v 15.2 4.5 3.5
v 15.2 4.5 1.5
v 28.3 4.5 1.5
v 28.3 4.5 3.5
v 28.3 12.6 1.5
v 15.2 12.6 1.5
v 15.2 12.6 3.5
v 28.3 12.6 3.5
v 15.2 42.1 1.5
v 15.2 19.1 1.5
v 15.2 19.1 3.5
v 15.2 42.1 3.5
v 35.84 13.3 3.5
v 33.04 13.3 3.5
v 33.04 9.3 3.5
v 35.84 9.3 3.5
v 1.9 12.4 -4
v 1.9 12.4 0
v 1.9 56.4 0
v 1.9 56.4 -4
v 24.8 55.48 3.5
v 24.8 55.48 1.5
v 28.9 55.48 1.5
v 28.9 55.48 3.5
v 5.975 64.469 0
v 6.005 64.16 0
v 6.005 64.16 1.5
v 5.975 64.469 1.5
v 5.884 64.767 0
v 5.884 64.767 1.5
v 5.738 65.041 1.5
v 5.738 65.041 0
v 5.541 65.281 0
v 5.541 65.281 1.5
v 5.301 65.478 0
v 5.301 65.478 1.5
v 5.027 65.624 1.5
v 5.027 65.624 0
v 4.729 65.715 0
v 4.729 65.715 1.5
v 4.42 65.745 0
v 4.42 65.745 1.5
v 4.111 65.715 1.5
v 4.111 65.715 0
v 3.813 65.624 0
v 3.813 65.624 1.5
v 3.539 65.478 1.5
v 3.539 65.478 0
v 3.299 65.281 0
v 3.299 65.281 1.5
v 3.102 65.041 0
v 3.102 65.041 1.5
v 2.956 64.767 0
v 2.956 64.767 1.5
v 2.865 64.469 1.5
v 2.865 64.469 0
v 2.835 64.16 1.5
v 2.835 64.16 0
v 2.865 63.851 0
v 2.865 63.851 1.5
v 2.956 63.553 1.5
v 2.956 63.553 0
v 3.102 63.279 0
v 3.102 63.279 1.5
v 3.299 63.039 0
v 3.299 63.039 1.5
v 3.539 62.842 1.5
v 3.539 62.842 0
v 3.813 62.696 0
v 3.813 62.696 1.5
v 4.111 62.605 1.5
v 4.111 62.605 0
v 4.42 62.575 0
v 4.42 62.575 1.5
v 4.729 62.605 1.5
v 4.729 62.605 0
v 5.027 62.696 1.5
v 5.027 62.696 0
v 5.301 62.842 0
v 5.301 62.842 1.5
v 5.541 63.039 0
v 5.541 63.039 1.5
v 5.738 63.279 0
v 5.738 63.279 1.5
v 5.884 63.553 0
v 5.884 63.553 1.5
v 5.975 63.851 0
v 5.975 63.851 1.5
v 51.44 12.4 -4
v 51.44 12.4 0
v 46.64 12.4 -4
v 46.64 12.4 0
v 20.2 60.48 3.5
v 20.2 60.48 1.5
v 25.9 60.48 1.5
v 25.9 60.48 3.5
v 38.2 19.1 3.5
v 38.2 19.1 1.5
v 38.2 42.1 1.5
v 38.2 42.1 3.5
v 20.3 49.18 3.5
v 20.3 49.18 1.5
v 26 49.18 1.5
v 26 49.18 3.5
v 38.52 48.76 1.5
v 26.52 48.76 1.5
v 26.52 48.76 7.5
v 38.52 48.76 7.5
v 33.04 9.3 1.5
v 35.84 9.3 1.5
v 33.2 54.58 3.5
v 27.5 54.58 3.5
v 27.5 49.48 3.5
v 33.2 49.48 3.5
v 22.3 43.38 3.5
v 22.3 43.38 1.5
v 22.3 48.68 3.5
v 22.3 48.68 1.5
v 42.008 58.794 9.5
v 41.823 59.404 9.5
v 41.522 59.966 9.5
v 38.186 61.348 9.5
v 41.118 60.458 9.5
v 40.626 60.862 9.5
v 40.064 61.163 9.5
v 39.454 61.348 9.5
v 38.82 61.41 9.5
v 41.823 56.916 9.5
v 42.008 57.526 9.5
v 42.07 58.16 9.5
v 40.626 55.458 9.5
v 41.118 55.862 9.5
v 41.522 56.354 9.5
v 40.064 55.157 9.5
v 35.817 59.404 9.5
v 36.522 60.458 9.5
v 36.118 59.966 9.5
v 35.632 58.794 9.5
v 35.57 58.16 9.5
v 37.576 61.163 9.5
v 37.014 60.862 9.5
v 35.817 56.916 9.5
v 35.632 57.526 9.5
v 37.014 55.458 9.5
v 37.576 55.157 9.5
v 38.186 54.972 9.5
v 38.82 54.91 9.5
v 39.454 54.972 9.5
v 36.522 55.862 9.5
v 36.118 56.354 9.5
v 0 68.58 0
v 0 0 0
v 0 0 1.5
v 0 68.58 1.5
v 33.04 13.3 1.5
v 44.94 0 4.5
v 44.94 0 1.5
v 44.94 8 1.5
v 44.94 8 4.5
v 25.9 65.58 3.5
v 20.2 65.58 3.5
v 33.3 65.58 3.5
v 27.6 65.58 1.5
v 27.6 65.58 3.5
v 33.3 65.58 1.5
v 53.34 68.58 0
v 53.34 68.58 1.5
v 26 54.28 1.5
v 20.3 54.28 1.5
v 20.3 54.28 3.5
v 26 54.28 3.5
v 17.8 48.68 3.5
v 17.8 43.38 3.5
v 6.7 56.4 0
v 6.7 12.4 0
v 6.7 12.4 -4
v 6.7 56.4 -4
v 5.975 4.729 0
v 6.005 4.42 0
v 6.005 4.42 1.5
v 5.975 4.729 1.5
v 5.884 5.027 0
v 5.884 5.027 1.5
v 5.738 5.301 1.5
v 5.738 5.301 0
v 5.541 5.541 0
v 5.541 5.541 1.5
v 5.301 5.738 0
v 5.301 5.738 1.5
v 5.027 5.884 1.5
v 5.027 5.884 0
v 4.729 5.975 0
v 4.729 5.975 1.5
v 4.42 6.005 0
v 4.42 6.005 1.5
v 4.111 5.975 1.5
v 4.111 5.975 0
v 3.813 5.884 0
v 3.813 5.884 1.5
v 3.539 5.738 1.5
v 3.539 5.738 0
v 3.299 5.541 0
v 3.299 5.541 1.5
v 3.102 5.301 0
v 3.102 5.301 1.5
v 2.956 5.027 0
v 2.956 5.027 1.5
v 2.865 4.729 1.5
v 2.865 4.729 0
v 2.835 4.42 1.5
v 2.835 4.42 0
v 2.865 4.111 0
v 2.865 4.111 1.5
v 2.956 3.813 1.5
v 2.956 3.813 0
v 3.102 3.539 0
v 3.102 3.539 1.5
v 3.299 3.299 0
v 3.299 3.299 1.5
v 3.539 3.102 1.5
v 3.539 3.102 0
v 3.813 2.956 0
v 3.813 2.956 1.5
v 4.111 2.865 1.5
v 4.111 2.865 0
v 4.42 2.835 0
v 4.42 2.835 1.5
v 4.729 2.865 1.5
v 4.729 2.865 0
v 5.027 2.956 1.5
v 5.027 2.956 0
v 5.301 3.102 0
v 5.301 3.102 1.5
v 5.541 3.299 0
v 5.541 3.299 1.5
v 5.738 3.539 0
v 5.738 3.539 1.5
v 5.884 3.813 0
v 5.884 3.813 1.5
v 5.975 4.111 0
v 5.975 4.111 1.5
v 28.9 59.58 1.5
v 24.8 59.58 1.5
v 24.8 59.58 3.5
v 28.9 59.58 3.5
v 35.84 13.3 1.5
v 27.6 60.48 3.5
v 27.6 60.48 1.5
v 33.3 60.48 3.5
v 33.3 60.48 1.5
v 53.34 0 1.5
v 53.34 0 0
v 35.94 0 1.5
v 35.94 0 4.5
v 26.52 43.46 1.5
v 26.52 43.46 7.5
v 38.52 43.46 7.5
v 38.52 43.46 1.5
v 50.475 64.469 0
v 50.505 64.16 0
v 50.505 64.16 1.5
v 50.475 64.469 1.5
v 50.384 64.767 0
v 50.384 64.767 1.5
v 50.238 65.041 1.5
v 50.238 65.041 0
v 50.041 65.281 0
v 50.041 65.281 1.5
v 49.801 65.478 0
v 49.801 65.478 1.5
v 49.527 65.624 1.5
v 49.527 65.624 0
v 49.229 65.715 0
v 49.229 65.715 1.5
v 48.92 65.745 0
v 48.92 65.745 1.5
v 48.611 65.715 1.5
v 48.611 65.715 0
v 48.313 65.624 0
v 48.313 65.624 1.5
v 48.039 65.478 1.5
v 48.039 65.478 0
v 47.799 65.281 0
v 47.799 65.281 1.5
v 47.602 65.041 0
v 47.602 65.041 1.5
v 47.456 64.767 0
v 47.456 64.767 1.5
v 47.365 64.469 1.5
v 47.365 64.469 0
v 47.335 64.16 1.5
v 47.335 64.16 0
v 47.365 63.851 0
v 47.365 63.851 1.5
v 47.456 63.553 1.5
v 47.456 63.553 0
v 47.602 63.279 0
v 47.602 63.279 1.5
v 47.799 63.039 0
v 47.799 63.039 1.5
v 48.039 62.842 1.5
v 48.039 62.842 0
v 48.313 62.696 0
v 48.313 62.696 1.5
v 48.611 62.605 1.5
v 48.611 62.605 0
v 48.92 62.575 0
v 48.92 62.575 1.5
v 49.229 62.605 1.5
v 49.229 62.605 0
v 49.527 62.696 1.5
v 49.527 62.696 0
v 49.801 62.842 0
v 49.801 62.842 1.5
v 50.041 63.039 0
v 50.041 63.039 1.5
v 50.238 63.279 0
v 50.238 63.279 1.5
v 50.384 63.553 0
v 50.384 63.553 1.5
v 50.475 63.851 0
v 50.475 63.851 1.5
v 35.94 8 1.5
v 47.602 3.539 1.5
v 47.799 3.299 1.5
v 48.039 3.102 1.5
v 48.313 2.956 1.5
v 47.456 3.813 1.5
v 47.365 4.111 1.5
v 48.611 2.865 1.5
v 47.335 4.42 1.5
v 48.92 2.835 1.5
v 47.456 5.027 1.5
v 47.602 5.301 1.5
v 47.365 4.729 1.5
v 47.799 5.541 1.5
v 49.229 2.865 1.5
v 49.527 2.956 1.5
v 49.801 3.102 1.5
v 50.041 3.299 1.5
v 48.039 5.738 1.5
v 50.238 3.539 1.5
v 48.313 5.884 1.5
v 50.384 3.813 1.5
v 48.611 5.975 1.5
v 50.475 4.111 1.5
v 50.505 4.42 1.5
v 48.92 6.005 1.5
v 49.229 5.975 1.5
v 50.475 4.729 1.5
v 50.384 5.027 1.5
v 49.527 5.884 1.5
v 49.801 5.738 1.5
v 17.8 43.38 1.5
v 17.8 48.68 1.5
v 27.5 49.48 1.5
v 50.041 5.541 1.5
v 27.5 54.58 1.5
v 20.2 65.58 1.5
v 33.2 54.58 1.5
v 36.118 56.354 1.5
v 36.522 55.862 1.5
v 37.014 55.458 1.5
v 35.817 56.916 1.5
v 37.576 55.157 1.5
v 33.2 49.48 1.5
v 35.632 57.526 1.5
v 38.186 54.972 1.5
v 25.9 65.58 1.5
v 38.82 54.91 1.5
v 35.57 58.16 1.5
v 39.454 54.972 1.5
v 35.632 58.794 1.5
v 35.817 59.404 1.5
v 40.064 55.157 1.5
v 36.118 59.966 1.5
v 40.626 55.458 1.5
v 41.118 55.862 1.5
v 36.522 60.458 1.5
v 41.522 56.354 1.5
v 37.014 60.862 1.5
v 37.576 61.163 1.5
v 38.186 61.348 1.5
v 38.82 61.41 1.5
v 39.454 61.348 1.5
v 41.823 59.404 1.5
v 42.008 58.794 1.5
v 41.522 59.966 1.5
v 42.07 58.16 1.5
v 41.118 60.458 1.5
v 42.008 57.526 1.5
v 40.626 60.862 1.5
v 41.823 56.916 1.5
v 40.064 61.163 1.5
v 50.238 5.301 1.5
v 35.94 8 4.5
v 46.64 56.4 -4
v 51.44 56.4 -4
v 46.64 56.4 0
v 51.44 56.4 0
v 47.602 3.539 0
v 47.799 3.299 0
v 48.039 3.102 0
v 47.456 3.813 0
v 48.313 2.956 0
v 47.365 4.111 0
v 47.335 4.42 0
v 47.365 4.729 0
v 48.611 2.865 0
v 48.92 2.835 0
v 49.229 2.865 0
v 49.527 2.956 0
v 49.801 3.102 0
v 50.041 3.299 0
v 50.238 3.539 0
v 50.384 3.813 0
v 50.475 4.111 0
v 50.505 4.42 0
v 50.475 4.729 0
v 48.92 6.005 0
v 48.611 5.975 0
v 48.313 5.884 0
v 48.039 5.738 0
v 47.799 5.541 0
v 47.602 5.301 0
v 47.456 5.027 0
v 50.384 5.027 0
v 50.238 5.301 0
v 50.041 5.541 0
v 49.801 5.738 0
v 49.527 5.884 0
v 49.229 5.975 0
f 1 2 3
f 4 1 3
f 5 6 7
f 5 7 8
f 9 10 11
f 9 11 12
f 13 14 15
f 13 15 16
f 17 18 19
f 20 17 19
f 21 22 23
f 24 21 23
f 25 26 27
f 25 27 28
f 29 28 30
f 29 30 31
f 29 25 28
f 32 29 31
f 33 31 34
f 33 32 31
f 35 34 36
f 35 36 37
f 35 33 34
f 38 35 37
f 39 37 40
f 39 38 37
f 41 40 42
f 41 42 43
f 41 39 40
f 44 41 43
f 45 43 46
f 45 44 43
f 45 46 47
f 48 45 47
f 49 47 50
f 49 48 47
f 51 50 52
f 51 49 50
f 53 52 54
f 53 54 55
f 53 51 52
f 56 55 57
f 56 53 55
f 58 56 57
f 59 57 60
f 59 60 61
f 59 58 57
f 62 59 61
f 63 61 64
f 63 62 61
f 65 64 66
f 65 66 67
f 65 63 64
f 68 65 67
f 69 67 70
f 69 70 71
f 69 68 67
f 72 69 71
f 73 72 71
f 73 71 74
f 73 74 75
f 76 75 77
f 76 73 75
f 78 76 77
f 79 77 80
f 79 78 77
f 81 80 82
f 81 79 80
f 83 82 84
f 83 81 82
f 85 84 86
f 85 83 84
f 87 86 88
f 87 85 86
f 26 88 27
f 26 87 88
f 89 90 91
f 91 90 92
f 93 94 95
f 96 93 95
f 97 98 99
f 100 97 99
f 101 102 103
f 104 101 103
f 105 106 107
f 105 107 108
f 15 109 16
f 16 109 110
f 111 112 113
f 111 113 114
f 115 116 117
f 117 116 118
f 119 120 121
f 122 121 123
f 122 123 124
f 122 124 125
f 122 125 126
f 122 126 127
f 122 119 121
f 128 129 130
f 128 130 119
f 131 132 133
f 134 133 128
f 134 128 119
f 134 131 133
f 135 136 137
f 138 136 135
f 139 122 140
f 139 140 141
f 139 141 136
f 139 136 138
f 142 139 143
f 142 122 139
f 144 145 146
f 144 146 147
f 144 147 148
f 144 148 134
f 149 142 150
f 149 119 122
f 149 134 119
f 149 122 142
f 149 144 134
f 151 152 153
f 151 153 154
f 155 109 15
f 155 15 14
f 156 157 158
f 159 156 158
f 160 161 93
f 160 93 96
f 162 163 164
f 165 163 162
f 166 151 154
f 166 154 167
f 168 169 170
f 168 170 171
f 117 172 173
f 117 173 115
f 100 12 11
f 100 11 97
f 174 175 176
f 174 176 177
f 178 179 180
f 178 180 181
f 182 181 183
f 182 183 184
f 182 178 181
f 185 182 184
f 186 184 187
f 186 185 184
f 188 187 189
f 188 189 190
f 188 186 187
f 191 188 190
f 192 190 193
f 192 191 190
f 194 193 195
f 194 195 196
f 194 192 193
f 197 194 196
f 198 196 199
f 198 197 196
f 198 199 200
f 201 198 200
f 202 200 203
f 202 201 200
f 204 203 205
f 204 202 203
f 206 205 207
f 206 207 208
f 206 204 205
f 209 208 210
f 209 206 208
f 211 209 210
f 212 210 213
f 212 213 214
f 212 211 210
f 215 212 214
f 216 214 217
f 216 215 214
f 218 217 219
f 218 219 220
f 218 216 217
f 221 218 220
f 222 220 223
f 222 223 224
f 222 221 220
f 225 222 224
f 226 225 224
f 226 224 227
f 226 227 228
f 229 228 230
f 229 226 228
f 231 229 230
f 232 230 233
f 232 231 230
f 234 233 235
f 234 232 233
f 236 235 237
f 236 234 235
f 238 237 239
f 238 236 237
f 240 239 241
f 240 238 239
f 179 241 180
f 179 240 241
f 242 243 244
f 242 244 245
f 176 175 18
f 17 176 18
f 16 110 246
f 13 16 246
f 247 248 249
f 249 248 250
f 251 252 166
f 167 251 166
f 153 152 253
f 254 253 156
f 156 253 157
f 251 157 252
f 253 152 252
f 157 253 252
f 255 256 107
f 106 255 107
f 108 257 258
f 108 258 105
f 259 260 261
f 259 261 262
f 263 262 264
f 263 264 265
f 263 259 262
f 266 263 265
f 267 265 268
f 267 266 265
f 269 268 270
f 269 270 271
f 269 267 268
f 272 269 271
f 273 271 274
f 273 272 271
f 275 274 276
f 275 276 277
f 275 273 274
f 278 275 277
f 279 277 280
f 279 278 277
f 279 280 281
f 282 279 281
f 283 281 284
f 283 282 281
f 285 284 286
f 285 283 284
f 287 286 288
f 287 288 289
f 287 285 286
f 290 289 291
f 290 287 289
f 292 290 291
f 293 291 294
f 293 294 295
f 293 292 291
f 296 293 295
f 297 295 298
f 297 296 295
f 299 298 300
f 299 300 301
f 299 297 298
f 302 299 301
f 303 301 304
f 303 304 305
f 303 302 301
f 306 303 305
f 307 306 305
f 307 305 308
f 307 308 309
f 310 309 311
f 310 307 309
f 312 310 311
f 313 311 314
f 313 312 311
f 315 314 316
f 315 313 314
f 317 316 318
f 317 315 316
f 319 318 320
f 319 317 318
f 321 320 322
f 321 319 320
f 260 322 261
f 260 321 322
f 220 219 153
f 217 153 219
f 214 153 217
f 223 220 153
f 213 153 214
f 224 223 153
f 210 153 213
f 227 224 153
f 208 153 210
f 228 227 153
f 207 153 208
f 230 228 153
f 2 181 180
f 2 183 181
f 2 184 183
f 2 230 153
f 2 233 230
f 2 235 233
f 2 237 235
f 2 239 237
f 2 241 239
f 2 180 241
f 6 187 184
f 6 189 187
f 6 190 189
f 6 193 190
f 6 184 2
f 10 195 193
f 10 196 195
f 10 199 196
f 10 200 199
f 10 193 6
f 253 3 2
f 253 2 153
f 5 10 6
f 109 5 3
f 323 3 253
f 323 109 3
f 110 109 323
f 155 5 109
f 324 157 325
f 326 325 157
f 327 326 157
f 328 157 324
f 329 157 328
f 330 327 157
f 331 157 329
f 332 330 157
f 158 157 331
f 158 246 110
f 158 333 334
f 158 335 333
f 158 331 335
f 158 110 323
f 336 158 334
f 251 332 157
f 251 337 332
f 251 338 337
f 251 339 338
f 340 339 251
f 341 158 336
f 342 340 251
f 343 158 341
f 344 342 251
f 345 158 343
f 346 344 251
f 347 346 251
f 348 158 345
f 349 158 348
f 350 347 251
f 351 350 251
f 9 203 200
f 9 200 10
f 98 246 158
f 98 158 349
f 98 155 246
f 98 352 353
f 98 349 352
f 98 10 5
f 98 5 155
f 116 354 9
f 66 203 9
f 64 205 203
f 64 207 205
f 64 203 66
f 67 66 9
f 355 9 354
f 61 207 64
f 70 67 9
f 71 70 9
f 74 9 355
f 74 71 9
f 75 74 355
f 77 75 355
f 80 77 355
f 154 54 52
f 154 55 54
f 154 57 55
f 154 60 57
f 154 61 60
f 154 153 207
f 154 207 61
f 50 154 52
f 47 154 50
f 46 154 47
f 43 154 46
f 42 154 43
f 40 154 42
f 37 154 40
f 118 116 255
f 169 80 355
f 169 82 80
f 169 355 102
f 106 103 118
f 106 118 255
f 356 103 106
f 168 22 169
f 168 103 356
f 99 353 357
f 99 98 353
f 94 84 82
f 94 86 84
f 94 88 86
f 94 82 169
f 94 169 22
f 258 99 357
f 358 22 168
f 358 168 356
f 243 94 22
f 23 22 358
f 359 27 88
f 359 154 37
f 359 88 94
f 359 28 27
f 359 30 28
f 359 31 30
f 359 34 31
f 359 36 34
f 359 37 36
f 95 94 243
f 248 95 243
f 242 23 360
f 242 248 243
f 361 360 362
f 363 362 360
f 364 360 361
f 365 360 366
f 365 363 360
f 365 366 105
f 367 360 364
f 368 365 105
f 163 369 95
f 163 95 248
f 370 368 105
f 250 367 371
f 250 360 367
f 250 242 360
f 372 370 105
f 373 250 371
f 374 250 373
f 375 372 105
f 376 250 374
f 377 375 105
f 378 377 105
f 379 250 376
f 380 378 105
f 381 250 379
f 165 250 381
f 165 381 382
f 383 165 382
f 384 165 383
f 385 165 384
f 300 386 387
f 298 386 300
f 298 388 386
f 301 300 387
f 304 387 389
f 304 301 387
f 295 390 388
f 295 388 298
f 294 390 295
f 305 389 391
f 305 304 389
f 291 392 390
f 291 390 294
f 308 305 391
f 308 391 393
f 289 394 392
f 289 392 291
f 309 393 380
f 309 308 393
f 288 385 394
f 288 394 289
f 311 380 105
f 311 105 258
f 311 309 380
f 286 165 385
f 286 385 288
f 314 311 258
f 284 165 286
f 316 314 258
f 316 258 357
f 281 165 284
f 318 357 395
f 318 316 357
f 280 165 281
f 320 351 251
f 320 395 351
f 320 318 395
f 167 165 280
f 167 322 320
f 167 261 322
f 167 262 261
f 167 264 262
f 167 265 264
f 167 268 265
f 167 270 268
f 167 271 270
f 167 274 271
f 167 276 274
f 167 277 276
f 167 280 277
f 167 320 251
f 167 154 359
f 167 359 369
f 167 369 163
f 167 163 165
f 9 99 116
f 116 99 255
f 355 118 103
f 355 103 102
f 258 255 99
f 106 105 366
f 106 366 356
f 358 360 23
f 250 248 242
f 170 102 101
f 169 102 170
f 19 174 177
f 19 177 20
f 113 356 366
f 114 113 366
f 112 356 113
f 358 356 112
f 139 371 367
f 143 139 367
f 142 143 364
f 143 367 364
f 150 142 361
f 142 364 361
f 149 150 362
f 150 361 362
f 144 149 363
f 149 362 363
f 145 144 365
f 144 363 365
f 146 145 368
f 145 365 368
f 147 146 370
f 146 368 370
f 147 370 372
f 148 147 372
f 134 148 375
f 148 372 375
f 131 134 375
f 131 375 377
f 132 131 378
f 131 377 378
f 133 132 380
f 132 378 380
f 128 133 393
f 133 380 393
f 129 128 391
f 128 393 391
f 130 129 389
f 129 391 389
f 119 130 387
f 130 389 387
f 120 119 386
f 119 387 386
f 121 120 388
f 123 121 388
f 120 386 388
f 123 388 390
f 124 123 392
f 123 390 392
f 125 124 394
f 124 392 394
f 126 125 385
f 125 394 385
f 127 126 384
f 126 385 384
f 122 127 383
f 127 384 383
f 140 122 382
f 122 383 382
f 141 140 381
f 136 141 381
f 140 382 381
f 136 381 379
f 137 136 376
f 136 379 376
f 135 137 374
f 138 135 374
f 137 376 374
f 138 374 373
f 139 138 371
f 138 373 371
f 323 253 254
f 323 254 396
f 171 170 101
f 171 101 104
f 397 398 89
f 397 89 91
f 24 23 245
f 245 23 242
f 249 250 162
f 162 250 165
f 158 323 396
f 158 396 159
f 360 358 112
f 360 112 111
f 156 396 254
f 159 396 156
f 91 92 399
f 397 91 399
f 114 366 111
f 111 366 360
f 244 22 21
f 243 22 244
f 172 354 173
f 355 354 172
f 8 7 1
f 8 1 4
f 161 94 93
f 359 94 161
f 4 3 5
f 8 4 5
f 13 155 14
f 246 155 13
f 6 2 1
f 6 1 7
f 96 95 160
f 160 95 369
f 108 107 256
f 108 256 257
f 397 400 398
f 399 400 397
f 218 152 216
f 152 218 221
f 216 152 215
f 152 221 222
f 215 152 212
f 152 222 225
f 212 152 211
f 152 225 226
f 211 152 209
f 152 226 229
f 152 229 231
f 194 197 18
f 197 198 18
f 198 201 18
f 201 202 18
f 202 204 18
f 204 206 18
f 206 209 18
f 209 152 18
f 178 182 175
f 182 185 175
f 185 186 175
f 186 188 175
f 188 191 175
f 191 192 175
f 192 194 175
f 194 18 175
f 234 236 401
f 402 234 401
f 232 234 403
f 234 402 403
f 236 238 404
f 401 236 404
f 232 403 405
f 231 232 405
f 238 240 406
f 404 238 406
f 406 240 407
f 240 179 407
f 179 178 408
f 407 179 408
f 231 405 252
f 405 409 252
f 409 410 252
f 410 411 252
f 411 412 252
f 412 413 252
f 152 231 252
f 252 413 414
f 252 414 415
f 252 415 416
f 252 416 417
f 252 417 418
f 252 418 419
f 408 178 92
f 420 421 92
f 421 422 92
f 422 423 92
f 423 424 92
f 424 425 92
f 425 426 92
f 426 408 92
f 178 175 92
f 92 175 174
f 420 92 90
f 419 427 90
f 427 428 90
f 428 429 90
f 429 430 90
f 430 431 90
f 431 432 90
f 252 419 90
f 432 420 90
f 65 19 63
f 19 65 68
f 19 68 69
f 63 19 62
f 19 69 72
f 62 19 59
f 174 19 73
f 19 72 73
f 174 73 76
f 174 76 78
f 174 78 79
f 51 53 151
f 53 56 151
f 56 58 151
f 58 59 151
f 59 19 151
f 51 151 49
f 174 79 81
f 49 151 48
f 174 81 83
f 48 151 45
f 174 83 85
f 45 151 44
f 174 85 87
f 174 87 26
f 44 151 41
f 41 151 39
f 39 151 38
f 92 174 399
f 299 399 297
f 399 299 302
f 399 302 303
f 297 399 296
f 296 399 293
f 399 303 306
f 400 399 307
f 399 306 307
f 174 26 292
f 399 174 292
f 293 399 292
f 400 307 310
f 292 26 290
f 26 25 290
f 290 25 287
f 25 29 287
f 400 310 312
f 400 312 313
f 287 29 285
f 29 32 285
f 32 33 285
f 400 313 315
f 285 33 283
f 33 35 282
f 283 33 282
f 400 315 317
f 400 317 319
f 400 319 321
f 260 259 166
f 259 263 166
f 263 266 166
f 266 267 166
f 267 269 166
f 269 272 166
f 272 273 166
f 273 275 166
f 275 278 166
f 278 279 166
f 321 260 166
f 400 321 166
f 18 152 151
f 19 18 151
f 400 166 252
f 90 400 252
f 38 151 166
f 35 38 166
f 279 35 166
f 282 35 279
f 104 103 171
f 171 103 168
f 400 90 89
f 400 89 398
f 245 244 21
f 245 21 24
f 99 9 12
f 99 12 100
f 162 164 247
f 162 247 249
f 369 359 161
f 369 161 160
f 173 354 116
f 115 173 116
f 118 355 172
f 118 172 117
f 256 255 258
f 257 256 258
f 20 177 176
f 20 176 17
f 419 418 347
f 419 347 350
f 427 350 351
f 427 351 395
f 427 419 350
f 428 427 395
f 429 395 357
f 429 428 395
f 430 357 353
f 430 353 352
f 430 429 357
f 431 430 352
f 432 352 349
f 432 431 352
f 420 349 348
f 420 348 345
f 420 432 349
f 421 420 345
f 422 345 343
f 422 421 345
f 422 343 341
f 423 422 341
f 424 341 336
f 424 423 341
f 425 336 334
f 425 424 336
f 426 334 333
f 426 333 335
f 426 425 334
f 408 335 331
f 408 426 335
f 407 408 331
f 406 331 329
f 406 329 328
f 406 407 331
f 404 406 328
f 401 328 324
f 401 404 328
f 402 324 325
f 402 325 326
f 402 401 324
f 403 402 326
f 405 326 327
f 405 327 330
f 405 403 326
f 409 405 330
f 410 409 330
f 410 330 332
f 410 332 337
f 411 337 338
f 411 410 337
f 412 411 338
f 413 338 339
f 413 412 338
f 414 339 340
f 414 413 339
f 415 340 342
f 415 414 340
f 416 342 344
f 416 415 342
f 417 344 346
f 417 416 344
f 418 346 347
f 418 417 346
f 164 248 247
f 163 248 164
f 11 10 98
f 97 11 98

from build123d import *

# Parameters (mm, degrees)
SKETCH_1_W      = 53.34
SKETCH_1_H      = 68.58
SKETCH_1_R      = 1.585
EXTRUDE_1_DEPTH = 1.5
SKETCH_2_R      = 3.25
EXTRUDE_2_DEPTH = 8
SKETCH_3_W      = 12
SKETCH_3_H      = 5.3
EXTRUDE_3_DEPTH = 6
SKETCH_4_W      = 2.8
SKETCH_4_H      = 4
EXTRUDE_4_DEPTH = 2
SKETCH_5_W      = 4.8
SKETCH_5_H      = 44
EXTRUDE_5_DEPTH = 4
SKETCH_6_W      = 9
SKETCH_6_H      = 8
EXTRUDE_6_DEPTH = 3
SKETCH_7_W      = 13.1
SKETCH_7_H      = 8.1
SKETCH_7_W_2    = 4.5
SKETCH_7_H_2    = 5.3
SKETCH_7_W_3    = 5.7
SKETCH_7_H_3    = 5.1
SKETCH_7_W_4    = 4.1
SKETCH_7_H_4    = 4.1
SKETCH_7_W_5    = 23
SKETCH_7_H_5    = 23
EXTRUDE_7_DEPTH = 2


with BuildPart() as part:
    # 草图1 → 凸台-拉伸1 (new body)
    with BuildSketch(Plane.XY):
        with Locations((26.67, 34.29)):
            Rectangle(SKETCH_1_W, SKETCH_1_H)
        with Locations((48.92, 64.16)):
            Circle(SKETCH_1_R, mode=Mode.SUBTRACT)
        with Locations((4.42, 64.16)):
            Circle(SKETCH_1_R, mode=Mode.SUBTRACT)
        with Locations((4.42, 4.42)):
            Circle(SKETCH_1_R, mode=Mode.SUBTRACT)
        with Locations((48.92, 4.42)):
            Circle(SKETCH_1_R, mode=Mode.SUBTRACT)
    extrude(amount=EXTRUDE_1_DEPTH)

    # 草图2 → 凸台-拉伸2 (add)
    with BuildSketch(Plane.XY.offset(1.5)):
        with Locations(Location((38.82, 58.16, 0), (0, 0, 180))):
            Circle(SKETCH_2_R)
    extrude(amount=EXTRUDE_2_DEPTH)

    # 草图3 → 凸台-拉伸3 (add)
    with BuildSketch(Plane.XY.offset(1.5)):
        with Locations((32.52, 46.11)):
            Rectangle(SKETCH_3_W, SKETCH_3_H)
    extrude(amount=EXTRUDE_3_DEPTH)

    # 草图4 → 凸台-拉伸4 (add)
    with BuildSketch(Plane.XY.offset(1.5)):
        with Locations((34.44, 11.3)):
            Rectangle(SKETCH_4_W, SKETCH_4_H)
    extrude(amount=EXTRUDE_4_DEPTH)

    # 草图5 → 凸台-拉伸5 (add)
    with BuildSketch(Plane(origin=(0, 0, 0), x_dir=(-1, 0, 0), z_dir=(0, 0, -1))):
        with Locations((-49.04, 34.4)):
            Rectangle(SKETCH_5_W, SKETCH_5_H)
        with Locations((-4.3, 34.4)):
            Rectangle(SKETCH_5_W, SKETCH_5_H)
    extrude(amount=EXTRUDE_5_DEPTH)

    # 草图6 → 凸台-拉伸6 (add)
    with BuildSketch(Plane.XY.offset(1.5)):
        with Locations((40.44, 4)):
            Rectangle(SKETCH_6_W, SKETCH_6_H)
    extrude(amount=EXTRUDE_6_DEPTH)

    # 草图7 → 凸台-拉伸7 (add)
    with BuildSketch(Plane.XY.offset(1.5)):
        with Locations((21.75, 8.55)):
            Rectangle(SKETCH_7_W, SKETCH_7_H)
        with Locations((20.05, 46.03)):
            Rectangle(SKETCH_7_W_2, SKETCH_7_H_2)
        with Locations((23.05, 63.03)):
            Rectangle(SKETCH_7_W_3, SKETCH_7_H_3)
        with Locations((30.45, 63.03)):
            Rectangle(SKETCH_7_W_3, SKETCH_7_H_3)
        with Locations((23.15, 51.73)):
            Rectangle(SKETCH_7_W_3, SKETCH_7_H_3)
        with Locations((30.35, 52.03)):
            Rectangle(SKETCH_7_W_3, SKETCH_7_H_3)
        with Locations((26.85, 57.53)):
            Rectangle(SKETCH_7_W_4, SKETCH_7_H_4)
        with Locations((26.7, 30.6)):
            Rectangle(SKETCH_7_W_5, SKETCH_7_H_5)
    extrude(amount=EXTRUDE_7_DEPTH)


solid = part.part
